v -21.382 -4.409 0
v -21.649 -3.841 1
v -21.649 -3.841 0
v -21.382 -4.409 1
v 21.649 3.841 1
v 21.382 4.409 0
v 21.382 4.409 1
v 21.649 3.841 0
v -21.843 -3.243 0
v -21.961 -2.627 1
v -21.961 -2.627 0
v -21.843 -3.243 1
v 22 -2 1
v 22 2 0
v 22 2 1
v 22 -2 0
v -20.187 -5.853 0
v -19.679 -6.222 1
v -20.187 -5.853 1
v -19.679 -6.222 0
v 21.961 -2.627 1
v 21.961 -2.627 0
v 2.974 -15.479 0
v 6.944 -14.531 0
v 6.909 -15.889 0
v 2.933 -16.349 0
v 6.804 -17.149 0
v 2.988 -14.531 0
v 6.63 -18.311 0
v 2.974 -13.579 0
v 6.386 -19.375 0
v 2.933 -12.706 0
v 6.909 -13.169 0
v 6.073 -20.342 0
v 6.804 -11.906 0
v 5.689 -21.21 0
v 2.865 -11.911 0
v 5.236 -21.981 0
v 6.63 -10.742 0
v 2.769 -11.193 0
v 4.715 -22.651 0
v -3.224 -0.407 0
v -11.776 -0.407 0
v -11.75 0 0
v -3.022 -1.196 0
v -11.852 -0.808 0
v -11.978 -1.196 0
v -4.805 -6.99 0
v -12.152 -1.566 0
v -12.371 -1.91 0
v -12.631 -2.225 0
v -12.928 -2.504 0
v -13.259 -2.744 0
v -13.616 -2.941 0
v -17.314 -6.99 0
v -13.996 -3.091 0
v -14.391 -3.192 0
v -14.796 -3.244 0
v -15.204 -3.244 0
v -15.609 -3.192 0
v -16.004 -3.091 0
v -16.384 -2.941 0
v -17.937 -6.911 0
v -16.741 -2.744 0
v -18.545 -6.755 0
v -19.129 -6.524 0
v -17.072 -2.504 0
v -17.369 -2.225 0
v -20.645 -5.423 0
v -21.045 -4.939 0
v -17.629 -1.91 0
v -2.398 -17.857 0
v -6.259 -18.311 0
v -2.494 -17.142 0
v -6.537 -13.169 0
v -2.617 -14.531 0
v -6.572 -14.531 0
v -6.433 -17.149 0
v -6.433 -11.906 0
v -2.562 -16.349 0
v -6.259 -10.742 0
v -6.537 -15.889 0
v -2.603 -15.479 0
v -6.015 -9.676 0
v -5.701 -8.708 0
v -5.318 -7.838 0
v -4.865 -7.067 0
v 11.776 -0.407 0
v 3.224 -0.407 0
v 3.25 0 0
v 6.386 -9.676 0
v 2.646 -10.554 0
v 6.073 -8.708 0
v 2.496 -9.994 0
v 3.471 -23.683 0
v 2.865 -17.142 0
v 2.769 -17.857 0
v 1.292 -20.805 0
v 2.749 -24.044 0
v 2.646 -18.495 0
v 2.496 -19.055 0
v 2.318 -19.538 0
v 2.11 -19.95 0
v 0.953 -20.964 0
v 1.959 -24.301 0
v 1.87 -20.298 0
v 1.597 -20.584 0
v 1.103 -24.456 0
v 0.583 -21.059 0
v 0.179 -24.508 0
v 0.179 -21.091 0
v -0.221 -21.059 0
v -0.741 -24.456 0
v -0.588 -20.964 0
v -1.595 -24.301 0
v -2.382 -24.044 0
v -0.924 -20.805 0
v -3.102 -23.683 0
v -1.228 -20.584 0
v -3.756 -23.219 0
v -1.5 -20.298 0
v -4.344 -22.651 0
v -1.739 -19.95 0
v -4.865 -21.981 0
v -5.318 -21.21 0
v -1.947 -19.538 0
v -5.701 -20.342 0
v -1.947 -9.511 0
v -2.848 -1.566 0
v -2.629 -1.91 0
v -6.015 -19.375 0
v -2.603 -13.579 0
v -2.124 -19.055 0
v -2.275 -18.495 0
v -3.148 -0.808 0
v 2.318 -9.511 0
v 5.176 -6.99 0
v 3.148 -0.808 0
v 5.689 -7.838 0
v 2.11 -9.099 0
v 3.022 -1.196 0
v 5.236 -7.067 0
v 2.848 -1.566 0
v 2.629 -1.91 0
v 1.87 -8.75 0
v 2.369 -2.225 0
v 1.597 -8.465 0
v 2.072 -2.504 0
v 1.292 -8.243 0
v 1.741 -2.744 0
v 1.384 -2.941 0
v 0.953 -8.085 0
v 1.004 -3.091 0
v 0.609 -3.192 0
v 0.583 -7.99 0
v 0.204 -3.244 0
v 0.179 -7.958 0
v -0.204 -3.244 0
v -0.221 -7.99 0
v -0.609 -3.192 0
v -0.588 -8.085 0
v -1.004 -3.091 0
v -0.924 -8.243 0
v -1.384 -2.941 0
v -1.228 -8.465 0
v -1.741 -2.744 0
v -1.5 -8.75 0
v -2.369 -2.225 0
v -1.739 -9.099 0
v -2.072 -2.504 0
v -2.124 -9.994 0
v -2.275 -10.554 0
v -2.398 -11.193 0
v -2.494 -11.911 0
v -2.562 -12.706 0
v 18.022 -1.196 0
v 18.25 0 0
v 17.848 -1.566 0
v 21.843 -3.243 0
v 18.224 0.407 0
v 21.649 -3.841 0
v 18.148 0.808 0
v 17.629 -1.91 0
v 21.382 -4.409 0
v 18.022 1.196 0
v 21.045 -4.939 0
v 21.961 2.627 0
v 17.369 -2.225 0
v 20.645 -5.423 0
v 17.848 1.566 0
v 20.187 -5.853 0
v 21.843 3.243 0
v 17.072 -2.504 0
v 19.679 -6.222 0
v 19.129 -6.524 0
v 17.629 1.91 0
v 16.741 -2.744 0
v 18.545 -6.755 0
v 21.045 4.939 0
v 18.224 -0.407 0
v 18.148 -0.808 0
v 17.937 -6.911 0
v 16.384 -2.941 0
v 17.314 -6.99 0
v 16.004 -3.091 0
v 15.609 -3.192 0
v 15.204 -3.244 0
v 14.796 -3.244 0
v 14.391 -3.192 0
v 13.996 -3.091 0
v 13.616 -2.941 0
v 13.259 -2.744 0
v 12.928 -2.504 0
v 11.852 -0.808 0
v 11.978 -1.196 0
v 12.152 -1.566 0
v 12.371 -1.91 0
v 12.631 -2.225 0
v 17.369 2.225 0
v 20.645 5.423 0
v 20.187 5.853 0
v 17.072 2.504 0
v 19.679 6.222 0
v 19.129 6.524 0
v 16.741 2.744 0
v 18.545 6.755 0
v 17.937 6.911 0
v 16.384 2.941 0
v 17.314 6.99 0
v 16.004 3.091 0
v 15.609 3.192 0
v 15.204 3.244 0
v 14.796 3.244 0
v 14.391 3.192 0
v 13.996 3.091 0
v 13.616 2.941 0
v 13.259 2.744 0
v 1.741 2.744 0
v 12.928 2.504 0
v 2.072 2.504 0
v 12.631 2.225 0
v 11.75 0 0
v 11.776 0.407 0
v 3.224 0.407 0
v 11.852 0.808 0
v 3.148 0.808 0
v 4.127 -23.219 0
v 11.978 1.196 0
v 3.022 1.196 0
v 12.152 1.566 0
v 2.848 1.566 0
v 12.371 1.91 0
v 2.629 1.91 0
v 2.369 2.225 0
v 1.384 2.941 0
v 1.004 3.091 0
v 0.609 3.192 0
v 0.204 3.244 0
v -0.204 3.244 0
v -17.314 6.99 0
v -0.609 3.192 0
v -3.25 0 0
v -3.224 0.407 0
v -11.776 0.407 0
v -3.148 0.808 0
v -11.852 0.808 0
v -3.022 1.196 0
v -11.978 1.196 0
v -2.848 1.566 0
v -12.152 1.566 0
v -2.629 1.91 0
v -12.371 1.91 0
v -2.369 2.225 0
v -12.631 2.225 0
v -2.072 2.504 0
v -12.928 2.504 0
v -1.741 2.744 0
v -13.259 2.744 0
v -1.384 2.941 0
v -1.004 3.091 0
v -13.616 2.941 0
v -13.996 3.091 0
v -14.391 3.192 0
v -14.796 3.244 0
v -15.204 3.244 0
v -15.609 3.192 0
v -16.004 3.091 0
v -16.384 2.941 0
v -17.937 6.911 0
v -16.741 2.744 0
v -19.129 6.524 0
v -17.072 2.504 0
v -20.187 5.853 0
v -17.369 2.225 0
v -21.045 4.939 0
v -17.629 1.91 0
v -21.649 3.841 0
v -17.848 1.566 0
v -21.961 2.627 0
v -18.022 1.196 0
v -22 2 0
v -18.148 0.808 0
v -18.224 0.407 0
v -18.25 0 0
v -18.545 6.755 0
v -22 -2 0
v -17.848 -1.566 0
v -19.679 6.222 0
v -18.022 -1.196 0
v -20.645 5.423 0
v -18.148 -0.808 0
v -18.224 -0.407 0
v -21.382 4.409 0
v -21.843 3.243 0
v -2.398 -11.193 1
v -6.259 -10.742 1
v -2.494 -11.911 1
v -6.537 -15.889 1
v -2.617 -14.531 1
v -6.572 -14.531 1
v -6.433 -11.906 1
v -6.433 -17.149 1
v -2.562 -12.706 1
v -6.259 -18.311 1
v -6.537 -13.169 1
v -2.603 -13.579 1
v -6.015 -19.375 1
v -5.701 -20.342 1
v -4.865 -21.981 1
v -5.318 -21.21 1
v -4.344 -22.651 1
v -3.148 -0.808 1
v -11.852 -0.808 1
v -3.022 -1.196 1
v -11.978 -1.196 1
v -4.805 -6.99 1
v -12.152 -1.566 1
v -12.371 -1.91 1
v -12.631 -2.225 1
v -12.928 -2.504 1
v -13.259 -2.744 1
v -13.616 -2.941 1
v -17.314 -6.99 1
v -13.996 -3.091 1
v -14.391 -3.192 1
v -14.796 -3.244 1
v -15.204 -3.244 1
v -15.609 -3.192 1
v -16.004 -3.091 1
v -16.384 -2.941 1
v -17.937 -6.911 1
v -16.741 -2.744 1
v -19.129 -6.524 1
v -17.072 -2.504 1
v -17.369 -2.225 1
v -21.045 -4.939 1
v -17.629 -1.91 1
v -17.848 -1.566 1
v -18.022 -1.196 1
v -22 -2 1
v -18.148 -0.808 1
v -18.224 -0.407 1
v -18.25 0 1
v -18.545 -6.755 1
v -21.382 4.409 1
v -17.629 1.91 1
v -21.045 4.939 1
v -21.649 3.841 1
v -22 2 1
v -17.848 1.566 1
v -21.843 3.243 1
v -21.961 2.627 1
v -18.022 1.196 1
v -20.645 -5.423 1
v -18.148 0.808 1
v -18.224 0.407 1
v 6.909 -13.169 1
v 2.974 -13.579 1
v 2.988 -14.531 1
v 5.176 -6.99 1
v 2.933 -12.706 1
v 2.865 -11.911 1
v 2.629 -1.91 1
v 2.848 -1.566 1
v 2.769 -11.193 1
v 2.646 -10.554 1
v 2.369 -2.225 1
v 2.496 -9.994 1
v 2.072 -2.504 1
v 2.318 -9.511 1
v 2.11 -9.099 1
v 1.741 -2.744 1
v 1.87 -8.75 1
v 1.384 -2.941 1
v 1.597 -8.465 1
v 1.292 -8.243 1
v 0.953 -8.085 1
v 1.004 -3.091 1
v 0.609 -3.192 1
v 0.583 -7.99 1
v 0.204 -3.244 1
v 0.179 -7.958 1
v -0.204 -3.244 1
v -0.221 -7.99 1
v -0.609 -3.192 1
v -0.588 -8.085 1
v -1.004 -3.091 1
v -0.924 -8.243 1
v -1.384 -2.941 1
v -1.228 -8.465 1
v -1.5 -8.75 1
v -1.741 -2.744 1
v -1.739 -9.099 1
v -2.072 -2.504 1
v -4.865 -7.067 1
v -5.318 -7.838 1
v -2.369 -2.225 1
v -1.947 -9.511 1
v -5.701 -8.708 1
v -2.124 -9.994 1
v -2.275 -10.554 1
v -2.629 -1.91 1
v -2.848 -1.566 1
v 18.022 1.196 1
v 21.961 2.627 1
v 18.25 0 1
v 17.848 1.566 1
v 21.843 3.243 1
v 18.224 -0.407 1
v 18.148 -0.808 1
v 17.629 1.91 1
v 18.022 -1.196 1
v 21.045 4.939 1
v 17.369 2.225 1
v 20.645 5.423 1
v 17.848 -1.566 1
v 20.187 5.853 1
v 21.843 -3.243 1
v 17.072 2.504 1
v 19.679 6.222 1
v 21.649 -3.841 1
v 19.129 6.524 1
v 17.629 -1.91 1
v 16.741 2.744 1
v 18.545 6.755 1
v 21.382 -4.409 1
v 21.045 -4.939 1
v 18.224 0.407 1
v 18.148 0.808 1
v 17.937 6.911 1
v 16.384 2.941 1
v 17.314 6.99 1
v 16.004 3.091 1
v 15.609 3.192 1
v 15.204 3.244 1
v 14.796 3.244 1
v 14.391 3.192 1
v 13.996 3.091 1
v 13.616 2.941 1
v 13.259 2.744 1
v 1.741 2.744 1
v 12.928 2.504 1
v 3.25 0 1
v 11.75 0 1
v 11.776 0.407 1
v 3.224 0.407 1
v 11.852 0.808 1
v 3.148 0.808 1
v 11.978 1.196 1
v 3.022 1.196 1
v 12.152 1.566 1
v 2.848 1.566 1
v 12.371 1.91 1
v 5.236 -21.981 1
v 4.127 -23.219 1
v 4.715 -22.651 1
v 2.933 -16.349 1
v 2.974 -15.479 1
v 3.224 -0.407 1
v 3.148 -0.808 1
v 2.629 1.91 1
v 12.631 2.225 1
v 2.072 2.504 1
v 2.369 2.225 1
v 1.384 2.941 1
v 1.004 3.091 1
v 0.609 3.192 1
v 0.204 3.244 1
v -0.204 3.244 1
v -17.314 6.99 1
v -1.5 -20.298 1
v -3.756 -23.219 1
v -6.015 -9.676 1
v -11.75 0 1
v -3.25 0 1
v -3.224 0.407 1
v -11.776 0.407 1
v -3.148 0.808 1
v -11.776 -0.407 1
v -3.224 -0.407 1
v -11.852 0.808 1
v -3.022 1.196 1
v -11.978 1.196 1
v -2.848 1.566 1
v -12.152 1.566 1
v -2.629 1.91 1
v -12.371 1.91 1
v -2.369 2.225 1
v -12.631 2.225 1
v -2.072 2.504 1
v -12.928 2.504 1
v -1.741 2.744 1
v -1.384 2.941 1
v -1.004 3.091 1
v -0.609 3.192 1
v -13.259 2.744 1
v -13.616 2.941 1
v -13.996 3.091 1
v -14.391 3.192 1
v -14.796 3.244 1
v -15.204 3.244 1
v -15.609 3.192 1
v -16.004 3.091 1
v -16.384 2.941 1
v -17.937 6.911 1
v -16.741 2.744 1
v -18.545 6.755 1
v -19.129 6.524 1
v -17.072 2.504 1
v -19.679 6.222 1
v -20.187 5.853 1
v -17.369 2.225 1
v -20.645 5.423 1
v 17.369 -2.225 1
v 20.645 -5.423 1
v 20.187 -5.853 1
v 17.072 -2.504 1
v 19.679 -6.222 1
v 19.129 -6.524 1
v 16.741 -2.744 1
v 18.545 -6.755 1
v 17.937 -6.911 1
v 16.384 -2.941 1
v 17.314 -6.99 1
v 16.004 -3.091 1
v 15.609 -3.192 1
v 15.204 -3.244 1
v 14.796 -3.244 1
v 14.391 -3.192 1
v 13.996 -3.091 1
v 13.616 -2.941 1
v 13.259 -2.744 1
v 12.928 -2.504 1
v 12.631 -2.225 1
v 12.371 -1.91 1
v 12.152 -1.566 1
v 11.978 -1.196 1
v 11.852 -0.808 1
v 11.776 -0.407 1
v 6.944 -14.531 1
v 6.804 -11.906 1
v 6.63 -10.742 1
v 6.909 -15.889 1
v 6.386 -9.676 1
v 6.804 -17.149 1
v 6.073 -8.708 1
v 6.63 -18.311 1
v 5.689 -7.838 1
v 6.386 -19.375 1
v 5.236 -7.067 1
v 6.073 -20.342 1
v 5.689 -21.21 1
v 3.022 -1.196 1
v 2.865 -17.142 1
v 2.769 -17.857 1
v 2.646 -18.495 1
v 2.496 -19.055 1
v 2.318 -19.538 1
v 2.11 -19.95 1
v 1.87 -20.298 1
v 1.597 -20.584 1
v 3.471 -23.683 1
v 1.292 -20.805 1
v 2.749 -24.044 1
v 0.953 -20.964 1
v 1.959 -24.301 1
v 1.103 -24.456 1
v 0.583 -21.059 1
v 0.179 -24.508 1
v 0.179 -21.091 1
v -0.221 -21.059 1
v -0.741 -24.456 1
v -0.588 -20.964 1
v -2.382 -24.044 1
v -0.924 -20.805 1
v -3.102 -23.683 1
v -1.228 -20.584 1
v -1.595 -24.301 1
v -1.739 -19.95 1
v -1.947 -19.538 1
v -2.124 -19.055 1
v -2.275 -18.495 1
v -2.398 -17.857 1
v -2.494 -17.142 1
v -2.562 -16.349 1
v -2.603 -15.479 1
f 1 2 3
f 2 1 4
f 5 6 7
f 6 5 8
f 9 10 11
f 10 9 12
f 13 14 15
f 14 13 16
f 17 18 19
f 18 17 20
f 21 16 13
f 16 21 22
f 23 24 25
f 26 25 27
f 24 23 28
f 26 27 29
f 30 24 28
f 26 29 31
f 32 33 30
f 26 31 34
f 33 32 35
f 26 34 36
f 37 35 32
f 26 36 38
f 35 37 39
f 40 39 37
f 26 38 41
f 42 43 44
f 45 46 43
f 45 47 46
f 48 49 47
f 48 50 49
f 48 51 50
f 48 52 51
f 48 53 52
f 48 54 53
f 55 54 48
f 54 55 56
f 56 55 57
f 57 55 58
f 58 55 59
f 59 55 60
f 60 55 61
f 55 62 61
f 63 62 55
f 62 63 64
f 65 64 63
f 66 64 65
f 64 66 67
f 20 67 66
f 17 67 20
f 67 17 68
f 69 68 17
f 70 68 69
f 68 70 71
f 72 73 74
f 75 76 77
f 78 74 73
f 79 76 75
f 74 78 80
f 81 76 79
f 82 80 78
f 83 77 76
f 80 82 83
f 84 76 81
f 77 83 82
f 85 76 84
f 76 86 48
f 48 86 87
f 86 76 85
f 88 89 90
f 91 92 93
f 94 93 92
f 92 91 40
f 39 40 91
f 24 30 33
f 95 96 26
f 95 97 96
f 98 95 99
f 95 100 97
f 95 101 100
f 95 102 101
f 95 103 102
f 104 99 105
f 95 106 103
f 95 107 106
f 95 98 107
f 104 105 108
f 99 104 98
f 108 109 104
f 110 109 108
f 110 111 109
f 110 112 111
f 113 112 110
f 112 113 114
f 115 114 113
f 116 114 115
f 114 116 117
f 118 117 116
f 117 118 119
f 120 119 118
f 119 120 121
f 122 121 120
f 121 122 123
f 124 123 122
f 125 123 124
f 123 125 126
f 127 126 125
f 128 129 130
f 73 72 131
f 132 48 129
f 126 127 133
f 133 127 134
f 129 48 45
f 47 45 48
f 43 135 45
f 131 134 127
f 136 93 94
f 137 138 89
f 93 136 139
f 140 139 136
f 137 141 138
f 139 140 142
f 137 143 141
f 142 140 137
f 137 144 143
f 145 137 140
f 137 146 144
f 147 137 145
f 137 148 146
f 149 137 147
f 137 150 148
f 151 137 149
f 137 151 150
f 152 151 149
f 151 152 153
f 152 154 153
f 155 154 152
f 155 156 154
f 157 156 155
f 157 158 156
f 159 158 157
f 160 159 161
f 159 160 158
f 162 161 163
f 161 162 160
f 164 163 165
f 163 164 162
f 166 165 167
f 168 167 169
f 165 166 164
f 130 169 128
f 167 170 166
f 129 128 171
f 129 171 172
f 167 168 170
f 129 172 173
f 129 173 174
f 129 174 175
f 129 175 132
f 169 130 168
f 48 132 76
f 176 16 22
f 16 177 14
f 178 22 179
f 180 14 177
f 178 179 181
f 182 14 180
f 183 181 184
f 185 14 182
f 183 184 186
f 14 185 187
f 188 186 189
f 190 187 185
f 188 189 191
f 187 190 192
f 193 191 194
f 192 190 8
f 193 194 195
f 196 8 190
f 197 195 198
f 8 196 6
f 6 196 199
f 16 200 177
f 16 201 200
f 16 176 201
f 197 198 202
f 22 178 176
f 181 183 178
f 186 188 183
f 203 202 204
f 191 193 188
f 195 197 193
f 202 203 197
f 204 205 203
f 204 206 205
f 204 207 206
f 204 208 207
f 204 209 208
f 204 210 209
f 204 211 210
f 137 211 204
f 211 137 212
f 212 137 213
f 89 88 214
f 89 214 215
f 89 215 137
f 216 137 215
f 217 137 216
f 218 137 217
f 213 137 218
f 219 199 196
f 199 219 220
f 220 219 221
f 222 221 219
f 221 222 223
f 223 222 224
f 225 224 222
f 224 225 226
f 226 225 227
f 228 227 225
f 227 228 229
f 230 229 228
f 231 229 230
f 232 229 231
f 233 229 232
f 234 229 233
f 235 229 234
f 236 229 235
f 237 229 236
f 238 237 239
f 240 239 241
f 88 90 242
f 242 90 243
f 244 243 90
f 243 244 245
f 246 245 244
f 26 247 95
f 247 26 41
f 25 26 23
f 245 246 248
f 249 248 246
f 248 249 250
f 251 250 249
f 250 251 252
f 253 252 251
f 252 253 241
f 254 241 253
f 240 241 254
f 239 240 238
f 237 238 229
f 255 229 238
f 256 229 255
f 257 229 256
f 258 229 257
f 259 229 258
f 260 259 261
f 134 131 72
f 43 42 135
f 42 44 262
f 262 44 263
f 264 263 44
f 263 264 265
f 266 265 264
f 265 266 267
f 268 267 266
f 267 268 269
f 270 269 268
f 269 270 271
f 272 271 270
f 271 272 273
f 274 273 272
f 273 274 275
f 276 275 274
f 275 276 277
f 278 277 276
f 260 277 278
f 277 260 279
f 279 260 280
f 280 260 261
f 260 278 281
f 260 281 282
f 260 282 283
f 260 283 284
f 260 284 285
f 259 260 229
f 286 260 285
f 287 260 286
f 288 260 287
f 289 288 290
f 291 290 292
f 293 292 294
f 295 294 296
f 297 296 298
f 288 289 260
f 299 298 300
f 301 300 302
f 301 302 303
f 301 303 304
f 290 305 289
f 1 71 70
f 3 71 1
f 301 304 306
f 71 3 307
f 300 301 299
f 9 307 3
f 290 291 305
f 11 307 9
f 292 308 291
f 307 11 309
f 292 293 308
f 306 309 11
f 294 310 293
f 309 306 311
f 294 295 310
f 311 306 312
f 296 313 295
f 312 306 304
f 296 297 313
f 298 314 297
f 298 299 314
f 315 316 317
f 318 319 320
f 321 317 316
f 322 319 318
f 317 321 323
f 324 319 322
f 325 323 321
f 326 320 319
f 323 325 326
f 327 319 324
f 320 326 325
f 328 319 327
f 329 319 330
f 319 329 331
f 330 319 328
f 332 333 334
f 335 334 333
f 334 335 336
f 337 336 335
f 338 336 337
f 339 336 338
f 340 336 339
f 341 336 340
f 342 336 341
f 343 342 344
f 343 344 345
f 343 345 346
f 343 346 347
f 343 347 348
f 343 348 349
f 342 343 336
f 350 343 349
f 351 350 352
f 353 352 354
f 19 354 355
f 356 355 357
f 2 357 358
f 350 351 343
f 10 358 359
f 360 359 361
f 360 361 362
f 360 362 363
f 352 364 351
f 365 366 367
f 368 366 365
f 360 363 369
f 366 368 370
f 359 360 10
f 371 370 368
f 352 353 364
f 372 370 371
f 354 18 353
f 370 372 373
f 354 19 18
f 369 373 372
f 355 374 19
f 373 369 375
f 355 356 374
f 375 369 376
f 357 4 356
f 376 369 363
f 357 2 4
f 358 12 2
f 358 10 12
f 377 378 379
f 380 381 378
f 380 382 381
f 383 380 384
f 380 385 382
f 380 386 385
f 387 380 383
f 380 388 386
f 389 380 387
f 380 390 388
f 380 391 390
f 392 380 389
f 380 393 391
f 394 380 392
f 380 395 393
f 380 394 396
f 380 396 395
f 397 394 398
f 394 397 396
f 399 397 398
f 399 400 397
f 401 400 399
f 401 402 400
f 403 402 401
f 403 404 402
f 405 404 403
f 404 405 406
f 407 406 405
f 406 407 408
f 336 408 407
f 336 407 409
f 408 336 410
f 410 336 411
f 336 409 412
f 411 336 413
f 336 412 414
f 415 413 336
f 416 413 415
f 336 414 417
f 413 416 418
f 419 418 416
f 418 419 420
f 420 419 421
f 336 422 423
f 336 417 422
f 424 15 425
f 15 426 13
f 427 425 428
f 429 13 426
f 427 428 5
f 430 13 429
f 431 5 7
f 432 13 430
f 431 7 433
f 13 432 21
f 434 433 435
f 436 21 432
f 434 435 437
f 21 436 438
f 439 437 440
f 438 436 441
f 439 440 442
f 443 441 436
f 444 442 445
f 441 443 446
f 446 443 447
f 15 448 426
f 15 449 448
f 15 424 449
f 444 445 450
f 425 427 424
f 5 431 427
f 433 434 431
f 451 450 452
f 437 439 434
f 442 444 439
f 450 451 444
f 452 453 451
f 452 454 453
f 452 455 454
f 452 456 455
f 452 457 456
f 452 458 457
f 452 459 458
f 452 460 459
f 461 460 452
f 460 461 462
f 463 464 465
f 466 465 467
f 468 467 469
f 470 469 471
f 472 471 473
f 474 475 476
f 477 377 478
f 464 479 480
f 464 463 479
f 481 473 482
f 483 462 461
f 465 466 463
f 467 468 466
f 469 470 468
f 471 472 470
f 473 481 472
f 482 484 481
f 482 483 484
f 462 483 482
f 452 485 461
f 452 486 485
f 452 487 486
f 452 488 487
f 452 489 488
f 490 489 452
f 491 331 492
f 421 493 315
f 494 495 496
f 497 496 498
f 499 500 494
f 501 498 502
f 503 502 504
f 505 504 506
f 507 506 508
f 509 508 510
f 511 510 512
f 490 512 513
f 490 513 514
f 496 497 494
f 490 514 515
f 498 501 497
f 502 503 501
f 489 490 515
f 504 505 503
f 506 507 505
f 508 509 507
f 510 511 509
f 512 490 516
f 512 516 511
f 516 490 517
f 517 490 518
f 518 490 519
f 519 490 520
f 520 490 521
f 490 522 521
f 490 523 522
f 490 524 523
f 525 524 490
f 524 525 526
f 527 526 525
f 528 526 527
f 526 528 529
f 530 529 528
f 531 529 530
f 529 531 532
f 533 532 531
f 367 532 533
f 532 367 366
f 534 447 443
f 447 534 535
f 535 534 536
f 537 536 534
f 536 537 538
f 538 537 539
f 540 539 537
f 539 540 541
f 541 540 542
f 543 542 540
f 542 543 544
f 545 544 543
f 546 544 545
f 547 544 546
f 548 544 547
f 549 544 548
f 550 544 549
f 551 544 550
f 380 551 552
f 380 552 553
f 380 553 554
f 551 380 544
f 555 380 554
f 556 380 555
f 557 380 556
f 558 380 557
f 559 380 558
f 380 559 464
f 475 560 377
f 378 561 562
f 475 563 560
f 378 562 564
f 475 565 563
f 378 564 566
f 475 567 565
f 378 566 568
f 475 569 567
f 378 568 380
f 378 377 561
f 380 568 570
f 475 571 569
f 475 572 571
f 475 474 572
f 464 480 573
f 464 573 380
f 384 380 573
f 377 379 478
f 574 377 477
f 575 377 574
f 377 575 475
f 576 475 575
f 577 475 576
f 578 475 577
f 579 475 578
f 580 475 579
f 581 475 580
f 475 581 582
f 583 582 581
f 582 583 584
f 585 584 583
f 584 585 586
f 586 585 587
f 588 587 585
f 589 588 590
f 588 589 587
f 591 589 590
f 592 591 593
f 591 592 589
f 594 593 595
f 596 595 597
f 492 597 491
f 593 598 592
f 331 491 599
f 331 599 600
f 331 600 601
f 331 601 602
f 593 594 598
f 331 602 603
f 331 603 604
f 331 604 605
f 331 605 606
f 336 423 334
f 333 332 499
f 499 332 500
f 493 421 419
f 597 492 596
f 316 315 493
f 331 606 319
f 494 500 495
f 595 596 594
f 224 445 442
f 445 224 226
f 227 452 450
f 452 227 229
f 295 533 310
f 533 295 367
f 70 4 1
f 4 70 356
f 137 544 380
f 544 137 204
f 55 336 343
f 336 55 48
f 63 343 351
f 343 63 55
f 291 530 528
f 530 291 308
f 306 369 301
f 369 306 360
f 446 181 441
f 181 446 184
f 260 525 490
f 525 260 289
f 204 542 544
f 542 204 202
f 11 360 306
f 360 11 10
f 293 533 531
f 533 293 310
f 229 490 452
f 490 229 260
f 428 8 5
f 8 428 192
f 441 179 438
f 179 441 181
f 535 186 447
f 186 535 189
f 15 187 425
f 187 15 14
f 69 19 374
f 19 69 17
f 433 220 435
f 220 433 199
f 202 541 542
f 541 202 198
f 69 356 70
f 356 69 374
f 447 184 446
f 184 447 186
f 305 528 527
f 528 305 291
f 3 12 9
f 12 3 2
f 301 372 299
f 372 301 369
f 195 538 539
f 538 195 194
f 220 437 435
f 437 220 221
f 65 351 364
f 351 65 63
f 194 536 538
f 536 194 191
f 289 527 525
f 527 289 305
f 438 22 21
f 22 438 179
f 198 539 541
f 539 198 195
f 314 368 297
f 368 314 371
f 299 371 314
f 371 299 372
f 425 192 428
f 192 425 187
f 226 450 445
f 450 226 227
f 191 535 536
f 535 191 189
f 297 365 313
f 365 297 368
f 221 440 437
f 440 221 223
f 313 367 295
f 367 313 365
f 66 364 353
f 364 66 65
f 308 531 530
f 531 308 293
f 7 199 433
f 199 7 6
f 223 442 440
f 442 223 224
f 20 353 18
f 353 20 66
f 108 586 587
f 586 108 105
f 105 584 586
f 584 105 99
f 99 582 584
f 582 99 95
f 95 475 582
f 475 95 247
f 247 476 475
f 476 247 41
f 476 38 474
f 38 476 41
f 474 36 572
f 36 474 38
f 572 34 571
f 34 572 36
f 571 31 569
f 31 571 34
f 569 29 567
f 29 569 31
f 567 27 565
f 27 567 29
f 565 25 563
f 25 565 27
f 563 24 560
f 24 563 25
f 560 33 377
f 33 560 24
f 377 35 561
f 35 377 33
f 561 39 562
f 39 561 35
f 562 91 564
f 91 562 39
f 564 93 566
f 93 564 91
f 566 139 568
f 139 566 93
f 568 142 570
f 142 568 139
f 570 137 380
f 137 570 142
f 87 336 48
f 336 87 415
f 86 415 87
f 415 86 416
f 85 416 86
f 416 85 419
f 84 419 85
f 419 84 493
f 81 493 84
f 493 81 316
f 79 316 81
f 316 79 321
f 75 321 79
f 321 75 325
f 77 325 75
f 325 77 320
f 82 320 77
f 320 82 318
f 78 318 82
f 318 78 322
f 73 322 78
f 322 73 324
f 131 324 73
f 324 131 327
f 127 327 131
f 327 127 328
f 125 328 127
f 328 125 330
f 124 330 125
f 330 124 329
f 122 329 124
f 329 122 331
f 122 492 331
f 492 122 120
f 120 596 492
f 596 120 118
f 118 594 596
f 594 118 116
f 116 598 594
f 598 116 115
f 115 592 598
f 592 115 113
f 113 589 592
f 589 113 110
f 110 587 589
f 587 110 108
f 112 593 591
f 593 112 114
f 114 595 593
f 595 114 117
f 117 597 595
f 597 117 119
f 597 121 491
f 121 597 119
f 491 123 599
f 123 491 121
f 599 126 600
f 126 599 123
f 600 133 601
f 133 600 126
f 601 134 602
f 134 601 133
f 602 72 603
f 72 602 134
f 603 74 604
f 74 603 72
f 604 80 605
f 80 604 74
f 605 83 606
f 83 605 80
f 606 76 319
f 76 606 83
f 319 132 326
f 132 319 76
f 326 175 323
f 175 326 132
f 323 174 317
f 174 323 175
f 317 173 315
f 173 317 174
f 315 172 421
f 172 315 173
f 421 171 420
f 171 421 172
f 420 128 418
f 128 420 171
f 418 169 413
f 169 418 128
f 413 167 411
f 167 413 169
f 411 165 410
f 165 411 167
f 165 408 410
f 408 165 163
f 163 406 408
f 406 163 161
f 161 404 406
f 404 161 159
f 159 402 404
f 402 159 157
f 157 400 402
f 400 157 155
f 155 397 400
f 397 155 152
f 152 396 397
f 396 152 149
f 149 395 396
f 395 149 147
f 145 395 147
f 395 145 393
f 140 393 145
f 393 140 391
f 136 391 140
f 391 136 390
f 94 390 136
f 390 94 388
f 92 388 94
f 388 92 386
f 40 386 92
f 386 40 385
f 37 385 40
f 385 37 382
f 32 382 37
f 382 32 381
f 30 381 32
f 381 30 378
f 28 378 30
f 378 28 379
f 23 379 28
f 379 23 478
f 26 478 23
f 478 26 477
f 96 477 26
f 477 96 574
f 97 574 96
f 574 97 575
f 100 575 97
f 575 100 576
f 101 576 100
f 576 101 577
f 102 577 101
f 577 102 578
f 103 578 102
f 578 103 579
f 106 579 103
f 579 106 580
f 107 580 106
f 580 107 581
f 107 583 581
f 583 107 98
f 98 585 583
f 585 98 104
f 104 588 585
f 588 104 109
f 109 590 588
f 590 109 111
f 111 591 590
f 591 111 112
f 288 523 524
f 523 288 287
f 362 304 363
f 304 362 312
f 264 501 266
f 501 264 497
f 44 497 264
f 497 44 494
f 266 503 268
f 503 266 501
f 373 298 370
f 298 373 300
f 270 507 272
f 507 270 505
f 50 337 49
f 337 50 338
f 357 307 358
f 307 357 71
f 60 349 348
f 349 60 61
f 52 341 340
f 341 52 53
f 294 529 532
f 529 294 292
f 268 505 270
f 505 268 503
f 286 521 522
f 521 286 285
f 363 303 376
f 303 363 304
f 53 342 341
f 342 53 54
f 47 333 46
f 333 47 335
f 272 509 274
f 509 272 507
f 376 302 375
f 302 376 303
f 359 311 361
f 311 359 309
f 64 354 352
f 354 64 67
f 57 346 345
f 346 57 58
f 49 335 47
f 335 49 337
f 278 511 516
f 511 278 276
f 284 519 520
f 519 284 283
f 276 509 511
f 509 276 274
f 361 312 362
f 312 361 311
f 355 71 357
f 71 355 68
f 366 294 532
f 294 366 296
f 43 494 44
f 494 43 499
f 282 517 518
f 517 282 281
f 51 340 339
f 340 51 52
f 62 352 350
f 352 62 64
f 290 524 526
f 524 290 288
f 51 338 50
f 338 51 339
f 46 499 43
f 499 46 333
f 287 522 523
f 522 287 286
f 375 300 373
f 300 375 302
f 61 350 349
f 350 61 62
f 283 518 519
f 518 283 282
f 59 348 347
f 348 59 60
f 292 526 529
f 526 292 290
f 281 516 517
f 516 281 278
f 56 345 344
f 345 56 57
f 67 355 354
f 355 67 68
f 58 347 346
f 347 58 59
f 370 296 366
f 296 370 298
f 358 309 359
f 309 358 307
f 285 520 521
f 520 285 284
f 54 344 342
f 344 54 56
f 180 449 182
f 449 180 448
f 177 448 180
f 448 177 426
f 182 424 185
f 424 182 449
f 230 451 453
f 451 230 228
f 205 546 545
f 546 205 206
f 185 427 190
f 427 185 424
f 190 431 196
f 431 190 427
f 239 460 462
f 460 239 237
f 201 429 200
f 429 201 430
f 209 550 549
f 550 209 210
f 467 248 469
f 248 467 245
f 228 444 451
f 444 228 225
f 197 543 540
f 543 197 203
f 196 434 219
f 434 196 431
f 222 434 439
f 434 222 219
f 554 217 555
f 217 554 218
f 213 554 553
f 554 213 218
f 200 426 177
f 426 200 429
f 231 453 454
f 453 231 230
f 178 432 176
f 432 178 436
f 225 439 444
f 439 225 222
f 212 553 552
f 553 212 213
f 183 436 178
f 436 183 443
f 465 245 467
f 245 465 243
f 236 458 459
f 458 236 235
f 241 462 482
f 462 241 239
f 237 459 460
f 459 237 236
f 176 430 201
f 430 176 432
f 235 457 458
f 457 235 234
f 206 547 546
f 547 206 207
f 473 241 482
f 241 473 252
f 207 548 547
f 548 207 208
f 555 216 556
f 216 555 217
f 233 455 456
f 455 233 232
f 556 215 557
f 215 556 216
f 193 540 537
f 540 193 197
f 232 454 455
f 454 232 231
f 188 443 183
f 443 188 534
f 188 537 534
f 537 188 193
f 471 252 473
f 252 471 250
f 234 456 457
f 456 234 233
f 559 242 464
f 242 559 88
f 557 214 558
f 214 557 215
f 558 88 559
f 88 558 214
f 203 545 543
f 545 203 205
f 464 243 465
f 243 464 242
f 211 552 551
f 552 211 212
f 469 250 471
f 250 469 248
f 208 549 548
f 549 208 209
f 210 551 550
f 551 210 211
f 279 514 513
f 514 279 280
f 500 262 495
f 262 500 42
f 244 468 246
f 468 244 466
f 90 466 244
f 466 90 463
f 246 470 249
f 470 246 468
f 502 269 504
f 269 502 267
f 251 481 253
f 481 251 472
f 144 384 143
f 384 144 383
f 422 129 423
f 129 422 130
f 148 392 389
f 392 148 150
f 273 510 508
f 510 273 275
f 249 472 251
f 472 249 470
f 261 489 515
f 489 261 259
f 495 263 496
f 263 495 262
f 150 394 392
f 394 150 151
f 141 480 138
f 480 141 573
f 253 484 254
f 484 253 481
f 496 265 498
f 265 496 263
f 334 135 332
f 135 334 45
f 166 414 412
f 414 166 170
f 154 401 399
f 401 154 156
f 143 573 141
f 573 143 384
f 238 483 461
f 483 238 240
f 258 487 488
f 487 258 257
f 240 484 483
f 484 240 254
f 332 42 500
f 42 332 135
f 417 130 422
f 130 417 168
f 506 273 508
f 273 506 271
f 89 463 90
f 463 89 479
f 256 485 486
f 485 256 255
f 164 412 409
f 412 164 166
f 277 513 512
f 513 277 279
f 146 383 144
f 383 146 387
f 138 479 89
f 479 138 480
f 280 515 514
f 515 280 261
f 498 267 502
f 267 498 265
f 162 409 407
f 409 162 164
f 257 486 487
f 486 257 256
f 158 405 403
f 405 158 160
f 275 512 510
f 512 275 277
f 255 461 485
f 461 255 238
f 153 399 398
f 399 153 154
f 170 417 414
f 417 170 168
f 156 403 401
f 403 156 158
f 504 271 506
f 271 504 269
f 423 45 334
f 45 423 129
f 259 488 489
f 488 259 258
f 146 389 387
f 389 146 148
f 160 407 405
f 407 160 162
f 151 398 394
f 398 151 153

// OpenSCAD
$fn = 50;


difference() {
	union() {
		translate(v = [0, 0, 0]) {
			rotate(a = [0, 0, 0]) {
				hull() {
					translate(v = [-17.0000000000, 2.0000000000, 0]) {
						rotate(a = [0, 0, 0]) {
							translate(v = [0, 0, 0]) {
								rotate(a = [0, 0, 0]) {
									cylinder(h = 1, r = 5);
								}
							}
						}
					}
					translate(v = [17.0000000000, 2.0000000000, 0]) {
						rotate(a = [0, 0, 0]) {
							translate(v = [0, 0, 0]) {
								rotate(a = [0, 0, 0]) {
									cylinder(h = 1, r = 5);
								}
							}
						}
					}
					translate(v = [-17.0000000000, -2.0000000000, 0]) {
						rotate(a = [0, 0, 0]) {
							translate(v = [0, 0, 0]) {
								rotate(a = [0, 0, 0]) {
									cylinder(h = 1, r = 5);
								}
							}
						}
					}
					translate(v = [17.0000000000, -2.0000000000, 0]) {
						rotate(a = [0, 0, 0]) {
							translate(v = [0, 0, 0]) {
								rotate(a = [0, 0, 0]) {
									cylinder(h = 1, r = 5);
								}
							}
						}
					}
				}
			}
		}
		translate(v = [0, -5, 0]) {
			rotate(a = [0, 0, 0]) {
				linear_extrude(height = 1) {
					text(font = "DejaVu Sans Mono:style=Bold", halign = "center", size = 19.0000000000, text = "O", valign = "top");
				}
			}
		}
	}
	union() {
		translate(v = [-15.0000000000, 0.0000000000, -125.0000000000]) {
			rotate(a = [0, 0, 0]) {
				cylinder(h = 250, r = 3.2500000000);
			}
		}
		translate(v = [15.0000000000, 0.0000000000, -125.0000000000]) {
			rotate(a = [0, 0, 0]) {
				cylinder(h = 250, r = 3.2500000000);
			}
		}
		translate(v = [15.0000000000, 0.0000000000, -125.0000000000]) {
			rotate(a = [0, 0, 0]) {
				cylinder(h = 250, r = 3.2500000000);
			}
		}
		translate(v = [0, 0, -125.0000000000]) {
			rotate(a = [0, 0, 0]) {
				cylinder(h = 250, r = 3.2500000000);
			}
		}
	}
}
